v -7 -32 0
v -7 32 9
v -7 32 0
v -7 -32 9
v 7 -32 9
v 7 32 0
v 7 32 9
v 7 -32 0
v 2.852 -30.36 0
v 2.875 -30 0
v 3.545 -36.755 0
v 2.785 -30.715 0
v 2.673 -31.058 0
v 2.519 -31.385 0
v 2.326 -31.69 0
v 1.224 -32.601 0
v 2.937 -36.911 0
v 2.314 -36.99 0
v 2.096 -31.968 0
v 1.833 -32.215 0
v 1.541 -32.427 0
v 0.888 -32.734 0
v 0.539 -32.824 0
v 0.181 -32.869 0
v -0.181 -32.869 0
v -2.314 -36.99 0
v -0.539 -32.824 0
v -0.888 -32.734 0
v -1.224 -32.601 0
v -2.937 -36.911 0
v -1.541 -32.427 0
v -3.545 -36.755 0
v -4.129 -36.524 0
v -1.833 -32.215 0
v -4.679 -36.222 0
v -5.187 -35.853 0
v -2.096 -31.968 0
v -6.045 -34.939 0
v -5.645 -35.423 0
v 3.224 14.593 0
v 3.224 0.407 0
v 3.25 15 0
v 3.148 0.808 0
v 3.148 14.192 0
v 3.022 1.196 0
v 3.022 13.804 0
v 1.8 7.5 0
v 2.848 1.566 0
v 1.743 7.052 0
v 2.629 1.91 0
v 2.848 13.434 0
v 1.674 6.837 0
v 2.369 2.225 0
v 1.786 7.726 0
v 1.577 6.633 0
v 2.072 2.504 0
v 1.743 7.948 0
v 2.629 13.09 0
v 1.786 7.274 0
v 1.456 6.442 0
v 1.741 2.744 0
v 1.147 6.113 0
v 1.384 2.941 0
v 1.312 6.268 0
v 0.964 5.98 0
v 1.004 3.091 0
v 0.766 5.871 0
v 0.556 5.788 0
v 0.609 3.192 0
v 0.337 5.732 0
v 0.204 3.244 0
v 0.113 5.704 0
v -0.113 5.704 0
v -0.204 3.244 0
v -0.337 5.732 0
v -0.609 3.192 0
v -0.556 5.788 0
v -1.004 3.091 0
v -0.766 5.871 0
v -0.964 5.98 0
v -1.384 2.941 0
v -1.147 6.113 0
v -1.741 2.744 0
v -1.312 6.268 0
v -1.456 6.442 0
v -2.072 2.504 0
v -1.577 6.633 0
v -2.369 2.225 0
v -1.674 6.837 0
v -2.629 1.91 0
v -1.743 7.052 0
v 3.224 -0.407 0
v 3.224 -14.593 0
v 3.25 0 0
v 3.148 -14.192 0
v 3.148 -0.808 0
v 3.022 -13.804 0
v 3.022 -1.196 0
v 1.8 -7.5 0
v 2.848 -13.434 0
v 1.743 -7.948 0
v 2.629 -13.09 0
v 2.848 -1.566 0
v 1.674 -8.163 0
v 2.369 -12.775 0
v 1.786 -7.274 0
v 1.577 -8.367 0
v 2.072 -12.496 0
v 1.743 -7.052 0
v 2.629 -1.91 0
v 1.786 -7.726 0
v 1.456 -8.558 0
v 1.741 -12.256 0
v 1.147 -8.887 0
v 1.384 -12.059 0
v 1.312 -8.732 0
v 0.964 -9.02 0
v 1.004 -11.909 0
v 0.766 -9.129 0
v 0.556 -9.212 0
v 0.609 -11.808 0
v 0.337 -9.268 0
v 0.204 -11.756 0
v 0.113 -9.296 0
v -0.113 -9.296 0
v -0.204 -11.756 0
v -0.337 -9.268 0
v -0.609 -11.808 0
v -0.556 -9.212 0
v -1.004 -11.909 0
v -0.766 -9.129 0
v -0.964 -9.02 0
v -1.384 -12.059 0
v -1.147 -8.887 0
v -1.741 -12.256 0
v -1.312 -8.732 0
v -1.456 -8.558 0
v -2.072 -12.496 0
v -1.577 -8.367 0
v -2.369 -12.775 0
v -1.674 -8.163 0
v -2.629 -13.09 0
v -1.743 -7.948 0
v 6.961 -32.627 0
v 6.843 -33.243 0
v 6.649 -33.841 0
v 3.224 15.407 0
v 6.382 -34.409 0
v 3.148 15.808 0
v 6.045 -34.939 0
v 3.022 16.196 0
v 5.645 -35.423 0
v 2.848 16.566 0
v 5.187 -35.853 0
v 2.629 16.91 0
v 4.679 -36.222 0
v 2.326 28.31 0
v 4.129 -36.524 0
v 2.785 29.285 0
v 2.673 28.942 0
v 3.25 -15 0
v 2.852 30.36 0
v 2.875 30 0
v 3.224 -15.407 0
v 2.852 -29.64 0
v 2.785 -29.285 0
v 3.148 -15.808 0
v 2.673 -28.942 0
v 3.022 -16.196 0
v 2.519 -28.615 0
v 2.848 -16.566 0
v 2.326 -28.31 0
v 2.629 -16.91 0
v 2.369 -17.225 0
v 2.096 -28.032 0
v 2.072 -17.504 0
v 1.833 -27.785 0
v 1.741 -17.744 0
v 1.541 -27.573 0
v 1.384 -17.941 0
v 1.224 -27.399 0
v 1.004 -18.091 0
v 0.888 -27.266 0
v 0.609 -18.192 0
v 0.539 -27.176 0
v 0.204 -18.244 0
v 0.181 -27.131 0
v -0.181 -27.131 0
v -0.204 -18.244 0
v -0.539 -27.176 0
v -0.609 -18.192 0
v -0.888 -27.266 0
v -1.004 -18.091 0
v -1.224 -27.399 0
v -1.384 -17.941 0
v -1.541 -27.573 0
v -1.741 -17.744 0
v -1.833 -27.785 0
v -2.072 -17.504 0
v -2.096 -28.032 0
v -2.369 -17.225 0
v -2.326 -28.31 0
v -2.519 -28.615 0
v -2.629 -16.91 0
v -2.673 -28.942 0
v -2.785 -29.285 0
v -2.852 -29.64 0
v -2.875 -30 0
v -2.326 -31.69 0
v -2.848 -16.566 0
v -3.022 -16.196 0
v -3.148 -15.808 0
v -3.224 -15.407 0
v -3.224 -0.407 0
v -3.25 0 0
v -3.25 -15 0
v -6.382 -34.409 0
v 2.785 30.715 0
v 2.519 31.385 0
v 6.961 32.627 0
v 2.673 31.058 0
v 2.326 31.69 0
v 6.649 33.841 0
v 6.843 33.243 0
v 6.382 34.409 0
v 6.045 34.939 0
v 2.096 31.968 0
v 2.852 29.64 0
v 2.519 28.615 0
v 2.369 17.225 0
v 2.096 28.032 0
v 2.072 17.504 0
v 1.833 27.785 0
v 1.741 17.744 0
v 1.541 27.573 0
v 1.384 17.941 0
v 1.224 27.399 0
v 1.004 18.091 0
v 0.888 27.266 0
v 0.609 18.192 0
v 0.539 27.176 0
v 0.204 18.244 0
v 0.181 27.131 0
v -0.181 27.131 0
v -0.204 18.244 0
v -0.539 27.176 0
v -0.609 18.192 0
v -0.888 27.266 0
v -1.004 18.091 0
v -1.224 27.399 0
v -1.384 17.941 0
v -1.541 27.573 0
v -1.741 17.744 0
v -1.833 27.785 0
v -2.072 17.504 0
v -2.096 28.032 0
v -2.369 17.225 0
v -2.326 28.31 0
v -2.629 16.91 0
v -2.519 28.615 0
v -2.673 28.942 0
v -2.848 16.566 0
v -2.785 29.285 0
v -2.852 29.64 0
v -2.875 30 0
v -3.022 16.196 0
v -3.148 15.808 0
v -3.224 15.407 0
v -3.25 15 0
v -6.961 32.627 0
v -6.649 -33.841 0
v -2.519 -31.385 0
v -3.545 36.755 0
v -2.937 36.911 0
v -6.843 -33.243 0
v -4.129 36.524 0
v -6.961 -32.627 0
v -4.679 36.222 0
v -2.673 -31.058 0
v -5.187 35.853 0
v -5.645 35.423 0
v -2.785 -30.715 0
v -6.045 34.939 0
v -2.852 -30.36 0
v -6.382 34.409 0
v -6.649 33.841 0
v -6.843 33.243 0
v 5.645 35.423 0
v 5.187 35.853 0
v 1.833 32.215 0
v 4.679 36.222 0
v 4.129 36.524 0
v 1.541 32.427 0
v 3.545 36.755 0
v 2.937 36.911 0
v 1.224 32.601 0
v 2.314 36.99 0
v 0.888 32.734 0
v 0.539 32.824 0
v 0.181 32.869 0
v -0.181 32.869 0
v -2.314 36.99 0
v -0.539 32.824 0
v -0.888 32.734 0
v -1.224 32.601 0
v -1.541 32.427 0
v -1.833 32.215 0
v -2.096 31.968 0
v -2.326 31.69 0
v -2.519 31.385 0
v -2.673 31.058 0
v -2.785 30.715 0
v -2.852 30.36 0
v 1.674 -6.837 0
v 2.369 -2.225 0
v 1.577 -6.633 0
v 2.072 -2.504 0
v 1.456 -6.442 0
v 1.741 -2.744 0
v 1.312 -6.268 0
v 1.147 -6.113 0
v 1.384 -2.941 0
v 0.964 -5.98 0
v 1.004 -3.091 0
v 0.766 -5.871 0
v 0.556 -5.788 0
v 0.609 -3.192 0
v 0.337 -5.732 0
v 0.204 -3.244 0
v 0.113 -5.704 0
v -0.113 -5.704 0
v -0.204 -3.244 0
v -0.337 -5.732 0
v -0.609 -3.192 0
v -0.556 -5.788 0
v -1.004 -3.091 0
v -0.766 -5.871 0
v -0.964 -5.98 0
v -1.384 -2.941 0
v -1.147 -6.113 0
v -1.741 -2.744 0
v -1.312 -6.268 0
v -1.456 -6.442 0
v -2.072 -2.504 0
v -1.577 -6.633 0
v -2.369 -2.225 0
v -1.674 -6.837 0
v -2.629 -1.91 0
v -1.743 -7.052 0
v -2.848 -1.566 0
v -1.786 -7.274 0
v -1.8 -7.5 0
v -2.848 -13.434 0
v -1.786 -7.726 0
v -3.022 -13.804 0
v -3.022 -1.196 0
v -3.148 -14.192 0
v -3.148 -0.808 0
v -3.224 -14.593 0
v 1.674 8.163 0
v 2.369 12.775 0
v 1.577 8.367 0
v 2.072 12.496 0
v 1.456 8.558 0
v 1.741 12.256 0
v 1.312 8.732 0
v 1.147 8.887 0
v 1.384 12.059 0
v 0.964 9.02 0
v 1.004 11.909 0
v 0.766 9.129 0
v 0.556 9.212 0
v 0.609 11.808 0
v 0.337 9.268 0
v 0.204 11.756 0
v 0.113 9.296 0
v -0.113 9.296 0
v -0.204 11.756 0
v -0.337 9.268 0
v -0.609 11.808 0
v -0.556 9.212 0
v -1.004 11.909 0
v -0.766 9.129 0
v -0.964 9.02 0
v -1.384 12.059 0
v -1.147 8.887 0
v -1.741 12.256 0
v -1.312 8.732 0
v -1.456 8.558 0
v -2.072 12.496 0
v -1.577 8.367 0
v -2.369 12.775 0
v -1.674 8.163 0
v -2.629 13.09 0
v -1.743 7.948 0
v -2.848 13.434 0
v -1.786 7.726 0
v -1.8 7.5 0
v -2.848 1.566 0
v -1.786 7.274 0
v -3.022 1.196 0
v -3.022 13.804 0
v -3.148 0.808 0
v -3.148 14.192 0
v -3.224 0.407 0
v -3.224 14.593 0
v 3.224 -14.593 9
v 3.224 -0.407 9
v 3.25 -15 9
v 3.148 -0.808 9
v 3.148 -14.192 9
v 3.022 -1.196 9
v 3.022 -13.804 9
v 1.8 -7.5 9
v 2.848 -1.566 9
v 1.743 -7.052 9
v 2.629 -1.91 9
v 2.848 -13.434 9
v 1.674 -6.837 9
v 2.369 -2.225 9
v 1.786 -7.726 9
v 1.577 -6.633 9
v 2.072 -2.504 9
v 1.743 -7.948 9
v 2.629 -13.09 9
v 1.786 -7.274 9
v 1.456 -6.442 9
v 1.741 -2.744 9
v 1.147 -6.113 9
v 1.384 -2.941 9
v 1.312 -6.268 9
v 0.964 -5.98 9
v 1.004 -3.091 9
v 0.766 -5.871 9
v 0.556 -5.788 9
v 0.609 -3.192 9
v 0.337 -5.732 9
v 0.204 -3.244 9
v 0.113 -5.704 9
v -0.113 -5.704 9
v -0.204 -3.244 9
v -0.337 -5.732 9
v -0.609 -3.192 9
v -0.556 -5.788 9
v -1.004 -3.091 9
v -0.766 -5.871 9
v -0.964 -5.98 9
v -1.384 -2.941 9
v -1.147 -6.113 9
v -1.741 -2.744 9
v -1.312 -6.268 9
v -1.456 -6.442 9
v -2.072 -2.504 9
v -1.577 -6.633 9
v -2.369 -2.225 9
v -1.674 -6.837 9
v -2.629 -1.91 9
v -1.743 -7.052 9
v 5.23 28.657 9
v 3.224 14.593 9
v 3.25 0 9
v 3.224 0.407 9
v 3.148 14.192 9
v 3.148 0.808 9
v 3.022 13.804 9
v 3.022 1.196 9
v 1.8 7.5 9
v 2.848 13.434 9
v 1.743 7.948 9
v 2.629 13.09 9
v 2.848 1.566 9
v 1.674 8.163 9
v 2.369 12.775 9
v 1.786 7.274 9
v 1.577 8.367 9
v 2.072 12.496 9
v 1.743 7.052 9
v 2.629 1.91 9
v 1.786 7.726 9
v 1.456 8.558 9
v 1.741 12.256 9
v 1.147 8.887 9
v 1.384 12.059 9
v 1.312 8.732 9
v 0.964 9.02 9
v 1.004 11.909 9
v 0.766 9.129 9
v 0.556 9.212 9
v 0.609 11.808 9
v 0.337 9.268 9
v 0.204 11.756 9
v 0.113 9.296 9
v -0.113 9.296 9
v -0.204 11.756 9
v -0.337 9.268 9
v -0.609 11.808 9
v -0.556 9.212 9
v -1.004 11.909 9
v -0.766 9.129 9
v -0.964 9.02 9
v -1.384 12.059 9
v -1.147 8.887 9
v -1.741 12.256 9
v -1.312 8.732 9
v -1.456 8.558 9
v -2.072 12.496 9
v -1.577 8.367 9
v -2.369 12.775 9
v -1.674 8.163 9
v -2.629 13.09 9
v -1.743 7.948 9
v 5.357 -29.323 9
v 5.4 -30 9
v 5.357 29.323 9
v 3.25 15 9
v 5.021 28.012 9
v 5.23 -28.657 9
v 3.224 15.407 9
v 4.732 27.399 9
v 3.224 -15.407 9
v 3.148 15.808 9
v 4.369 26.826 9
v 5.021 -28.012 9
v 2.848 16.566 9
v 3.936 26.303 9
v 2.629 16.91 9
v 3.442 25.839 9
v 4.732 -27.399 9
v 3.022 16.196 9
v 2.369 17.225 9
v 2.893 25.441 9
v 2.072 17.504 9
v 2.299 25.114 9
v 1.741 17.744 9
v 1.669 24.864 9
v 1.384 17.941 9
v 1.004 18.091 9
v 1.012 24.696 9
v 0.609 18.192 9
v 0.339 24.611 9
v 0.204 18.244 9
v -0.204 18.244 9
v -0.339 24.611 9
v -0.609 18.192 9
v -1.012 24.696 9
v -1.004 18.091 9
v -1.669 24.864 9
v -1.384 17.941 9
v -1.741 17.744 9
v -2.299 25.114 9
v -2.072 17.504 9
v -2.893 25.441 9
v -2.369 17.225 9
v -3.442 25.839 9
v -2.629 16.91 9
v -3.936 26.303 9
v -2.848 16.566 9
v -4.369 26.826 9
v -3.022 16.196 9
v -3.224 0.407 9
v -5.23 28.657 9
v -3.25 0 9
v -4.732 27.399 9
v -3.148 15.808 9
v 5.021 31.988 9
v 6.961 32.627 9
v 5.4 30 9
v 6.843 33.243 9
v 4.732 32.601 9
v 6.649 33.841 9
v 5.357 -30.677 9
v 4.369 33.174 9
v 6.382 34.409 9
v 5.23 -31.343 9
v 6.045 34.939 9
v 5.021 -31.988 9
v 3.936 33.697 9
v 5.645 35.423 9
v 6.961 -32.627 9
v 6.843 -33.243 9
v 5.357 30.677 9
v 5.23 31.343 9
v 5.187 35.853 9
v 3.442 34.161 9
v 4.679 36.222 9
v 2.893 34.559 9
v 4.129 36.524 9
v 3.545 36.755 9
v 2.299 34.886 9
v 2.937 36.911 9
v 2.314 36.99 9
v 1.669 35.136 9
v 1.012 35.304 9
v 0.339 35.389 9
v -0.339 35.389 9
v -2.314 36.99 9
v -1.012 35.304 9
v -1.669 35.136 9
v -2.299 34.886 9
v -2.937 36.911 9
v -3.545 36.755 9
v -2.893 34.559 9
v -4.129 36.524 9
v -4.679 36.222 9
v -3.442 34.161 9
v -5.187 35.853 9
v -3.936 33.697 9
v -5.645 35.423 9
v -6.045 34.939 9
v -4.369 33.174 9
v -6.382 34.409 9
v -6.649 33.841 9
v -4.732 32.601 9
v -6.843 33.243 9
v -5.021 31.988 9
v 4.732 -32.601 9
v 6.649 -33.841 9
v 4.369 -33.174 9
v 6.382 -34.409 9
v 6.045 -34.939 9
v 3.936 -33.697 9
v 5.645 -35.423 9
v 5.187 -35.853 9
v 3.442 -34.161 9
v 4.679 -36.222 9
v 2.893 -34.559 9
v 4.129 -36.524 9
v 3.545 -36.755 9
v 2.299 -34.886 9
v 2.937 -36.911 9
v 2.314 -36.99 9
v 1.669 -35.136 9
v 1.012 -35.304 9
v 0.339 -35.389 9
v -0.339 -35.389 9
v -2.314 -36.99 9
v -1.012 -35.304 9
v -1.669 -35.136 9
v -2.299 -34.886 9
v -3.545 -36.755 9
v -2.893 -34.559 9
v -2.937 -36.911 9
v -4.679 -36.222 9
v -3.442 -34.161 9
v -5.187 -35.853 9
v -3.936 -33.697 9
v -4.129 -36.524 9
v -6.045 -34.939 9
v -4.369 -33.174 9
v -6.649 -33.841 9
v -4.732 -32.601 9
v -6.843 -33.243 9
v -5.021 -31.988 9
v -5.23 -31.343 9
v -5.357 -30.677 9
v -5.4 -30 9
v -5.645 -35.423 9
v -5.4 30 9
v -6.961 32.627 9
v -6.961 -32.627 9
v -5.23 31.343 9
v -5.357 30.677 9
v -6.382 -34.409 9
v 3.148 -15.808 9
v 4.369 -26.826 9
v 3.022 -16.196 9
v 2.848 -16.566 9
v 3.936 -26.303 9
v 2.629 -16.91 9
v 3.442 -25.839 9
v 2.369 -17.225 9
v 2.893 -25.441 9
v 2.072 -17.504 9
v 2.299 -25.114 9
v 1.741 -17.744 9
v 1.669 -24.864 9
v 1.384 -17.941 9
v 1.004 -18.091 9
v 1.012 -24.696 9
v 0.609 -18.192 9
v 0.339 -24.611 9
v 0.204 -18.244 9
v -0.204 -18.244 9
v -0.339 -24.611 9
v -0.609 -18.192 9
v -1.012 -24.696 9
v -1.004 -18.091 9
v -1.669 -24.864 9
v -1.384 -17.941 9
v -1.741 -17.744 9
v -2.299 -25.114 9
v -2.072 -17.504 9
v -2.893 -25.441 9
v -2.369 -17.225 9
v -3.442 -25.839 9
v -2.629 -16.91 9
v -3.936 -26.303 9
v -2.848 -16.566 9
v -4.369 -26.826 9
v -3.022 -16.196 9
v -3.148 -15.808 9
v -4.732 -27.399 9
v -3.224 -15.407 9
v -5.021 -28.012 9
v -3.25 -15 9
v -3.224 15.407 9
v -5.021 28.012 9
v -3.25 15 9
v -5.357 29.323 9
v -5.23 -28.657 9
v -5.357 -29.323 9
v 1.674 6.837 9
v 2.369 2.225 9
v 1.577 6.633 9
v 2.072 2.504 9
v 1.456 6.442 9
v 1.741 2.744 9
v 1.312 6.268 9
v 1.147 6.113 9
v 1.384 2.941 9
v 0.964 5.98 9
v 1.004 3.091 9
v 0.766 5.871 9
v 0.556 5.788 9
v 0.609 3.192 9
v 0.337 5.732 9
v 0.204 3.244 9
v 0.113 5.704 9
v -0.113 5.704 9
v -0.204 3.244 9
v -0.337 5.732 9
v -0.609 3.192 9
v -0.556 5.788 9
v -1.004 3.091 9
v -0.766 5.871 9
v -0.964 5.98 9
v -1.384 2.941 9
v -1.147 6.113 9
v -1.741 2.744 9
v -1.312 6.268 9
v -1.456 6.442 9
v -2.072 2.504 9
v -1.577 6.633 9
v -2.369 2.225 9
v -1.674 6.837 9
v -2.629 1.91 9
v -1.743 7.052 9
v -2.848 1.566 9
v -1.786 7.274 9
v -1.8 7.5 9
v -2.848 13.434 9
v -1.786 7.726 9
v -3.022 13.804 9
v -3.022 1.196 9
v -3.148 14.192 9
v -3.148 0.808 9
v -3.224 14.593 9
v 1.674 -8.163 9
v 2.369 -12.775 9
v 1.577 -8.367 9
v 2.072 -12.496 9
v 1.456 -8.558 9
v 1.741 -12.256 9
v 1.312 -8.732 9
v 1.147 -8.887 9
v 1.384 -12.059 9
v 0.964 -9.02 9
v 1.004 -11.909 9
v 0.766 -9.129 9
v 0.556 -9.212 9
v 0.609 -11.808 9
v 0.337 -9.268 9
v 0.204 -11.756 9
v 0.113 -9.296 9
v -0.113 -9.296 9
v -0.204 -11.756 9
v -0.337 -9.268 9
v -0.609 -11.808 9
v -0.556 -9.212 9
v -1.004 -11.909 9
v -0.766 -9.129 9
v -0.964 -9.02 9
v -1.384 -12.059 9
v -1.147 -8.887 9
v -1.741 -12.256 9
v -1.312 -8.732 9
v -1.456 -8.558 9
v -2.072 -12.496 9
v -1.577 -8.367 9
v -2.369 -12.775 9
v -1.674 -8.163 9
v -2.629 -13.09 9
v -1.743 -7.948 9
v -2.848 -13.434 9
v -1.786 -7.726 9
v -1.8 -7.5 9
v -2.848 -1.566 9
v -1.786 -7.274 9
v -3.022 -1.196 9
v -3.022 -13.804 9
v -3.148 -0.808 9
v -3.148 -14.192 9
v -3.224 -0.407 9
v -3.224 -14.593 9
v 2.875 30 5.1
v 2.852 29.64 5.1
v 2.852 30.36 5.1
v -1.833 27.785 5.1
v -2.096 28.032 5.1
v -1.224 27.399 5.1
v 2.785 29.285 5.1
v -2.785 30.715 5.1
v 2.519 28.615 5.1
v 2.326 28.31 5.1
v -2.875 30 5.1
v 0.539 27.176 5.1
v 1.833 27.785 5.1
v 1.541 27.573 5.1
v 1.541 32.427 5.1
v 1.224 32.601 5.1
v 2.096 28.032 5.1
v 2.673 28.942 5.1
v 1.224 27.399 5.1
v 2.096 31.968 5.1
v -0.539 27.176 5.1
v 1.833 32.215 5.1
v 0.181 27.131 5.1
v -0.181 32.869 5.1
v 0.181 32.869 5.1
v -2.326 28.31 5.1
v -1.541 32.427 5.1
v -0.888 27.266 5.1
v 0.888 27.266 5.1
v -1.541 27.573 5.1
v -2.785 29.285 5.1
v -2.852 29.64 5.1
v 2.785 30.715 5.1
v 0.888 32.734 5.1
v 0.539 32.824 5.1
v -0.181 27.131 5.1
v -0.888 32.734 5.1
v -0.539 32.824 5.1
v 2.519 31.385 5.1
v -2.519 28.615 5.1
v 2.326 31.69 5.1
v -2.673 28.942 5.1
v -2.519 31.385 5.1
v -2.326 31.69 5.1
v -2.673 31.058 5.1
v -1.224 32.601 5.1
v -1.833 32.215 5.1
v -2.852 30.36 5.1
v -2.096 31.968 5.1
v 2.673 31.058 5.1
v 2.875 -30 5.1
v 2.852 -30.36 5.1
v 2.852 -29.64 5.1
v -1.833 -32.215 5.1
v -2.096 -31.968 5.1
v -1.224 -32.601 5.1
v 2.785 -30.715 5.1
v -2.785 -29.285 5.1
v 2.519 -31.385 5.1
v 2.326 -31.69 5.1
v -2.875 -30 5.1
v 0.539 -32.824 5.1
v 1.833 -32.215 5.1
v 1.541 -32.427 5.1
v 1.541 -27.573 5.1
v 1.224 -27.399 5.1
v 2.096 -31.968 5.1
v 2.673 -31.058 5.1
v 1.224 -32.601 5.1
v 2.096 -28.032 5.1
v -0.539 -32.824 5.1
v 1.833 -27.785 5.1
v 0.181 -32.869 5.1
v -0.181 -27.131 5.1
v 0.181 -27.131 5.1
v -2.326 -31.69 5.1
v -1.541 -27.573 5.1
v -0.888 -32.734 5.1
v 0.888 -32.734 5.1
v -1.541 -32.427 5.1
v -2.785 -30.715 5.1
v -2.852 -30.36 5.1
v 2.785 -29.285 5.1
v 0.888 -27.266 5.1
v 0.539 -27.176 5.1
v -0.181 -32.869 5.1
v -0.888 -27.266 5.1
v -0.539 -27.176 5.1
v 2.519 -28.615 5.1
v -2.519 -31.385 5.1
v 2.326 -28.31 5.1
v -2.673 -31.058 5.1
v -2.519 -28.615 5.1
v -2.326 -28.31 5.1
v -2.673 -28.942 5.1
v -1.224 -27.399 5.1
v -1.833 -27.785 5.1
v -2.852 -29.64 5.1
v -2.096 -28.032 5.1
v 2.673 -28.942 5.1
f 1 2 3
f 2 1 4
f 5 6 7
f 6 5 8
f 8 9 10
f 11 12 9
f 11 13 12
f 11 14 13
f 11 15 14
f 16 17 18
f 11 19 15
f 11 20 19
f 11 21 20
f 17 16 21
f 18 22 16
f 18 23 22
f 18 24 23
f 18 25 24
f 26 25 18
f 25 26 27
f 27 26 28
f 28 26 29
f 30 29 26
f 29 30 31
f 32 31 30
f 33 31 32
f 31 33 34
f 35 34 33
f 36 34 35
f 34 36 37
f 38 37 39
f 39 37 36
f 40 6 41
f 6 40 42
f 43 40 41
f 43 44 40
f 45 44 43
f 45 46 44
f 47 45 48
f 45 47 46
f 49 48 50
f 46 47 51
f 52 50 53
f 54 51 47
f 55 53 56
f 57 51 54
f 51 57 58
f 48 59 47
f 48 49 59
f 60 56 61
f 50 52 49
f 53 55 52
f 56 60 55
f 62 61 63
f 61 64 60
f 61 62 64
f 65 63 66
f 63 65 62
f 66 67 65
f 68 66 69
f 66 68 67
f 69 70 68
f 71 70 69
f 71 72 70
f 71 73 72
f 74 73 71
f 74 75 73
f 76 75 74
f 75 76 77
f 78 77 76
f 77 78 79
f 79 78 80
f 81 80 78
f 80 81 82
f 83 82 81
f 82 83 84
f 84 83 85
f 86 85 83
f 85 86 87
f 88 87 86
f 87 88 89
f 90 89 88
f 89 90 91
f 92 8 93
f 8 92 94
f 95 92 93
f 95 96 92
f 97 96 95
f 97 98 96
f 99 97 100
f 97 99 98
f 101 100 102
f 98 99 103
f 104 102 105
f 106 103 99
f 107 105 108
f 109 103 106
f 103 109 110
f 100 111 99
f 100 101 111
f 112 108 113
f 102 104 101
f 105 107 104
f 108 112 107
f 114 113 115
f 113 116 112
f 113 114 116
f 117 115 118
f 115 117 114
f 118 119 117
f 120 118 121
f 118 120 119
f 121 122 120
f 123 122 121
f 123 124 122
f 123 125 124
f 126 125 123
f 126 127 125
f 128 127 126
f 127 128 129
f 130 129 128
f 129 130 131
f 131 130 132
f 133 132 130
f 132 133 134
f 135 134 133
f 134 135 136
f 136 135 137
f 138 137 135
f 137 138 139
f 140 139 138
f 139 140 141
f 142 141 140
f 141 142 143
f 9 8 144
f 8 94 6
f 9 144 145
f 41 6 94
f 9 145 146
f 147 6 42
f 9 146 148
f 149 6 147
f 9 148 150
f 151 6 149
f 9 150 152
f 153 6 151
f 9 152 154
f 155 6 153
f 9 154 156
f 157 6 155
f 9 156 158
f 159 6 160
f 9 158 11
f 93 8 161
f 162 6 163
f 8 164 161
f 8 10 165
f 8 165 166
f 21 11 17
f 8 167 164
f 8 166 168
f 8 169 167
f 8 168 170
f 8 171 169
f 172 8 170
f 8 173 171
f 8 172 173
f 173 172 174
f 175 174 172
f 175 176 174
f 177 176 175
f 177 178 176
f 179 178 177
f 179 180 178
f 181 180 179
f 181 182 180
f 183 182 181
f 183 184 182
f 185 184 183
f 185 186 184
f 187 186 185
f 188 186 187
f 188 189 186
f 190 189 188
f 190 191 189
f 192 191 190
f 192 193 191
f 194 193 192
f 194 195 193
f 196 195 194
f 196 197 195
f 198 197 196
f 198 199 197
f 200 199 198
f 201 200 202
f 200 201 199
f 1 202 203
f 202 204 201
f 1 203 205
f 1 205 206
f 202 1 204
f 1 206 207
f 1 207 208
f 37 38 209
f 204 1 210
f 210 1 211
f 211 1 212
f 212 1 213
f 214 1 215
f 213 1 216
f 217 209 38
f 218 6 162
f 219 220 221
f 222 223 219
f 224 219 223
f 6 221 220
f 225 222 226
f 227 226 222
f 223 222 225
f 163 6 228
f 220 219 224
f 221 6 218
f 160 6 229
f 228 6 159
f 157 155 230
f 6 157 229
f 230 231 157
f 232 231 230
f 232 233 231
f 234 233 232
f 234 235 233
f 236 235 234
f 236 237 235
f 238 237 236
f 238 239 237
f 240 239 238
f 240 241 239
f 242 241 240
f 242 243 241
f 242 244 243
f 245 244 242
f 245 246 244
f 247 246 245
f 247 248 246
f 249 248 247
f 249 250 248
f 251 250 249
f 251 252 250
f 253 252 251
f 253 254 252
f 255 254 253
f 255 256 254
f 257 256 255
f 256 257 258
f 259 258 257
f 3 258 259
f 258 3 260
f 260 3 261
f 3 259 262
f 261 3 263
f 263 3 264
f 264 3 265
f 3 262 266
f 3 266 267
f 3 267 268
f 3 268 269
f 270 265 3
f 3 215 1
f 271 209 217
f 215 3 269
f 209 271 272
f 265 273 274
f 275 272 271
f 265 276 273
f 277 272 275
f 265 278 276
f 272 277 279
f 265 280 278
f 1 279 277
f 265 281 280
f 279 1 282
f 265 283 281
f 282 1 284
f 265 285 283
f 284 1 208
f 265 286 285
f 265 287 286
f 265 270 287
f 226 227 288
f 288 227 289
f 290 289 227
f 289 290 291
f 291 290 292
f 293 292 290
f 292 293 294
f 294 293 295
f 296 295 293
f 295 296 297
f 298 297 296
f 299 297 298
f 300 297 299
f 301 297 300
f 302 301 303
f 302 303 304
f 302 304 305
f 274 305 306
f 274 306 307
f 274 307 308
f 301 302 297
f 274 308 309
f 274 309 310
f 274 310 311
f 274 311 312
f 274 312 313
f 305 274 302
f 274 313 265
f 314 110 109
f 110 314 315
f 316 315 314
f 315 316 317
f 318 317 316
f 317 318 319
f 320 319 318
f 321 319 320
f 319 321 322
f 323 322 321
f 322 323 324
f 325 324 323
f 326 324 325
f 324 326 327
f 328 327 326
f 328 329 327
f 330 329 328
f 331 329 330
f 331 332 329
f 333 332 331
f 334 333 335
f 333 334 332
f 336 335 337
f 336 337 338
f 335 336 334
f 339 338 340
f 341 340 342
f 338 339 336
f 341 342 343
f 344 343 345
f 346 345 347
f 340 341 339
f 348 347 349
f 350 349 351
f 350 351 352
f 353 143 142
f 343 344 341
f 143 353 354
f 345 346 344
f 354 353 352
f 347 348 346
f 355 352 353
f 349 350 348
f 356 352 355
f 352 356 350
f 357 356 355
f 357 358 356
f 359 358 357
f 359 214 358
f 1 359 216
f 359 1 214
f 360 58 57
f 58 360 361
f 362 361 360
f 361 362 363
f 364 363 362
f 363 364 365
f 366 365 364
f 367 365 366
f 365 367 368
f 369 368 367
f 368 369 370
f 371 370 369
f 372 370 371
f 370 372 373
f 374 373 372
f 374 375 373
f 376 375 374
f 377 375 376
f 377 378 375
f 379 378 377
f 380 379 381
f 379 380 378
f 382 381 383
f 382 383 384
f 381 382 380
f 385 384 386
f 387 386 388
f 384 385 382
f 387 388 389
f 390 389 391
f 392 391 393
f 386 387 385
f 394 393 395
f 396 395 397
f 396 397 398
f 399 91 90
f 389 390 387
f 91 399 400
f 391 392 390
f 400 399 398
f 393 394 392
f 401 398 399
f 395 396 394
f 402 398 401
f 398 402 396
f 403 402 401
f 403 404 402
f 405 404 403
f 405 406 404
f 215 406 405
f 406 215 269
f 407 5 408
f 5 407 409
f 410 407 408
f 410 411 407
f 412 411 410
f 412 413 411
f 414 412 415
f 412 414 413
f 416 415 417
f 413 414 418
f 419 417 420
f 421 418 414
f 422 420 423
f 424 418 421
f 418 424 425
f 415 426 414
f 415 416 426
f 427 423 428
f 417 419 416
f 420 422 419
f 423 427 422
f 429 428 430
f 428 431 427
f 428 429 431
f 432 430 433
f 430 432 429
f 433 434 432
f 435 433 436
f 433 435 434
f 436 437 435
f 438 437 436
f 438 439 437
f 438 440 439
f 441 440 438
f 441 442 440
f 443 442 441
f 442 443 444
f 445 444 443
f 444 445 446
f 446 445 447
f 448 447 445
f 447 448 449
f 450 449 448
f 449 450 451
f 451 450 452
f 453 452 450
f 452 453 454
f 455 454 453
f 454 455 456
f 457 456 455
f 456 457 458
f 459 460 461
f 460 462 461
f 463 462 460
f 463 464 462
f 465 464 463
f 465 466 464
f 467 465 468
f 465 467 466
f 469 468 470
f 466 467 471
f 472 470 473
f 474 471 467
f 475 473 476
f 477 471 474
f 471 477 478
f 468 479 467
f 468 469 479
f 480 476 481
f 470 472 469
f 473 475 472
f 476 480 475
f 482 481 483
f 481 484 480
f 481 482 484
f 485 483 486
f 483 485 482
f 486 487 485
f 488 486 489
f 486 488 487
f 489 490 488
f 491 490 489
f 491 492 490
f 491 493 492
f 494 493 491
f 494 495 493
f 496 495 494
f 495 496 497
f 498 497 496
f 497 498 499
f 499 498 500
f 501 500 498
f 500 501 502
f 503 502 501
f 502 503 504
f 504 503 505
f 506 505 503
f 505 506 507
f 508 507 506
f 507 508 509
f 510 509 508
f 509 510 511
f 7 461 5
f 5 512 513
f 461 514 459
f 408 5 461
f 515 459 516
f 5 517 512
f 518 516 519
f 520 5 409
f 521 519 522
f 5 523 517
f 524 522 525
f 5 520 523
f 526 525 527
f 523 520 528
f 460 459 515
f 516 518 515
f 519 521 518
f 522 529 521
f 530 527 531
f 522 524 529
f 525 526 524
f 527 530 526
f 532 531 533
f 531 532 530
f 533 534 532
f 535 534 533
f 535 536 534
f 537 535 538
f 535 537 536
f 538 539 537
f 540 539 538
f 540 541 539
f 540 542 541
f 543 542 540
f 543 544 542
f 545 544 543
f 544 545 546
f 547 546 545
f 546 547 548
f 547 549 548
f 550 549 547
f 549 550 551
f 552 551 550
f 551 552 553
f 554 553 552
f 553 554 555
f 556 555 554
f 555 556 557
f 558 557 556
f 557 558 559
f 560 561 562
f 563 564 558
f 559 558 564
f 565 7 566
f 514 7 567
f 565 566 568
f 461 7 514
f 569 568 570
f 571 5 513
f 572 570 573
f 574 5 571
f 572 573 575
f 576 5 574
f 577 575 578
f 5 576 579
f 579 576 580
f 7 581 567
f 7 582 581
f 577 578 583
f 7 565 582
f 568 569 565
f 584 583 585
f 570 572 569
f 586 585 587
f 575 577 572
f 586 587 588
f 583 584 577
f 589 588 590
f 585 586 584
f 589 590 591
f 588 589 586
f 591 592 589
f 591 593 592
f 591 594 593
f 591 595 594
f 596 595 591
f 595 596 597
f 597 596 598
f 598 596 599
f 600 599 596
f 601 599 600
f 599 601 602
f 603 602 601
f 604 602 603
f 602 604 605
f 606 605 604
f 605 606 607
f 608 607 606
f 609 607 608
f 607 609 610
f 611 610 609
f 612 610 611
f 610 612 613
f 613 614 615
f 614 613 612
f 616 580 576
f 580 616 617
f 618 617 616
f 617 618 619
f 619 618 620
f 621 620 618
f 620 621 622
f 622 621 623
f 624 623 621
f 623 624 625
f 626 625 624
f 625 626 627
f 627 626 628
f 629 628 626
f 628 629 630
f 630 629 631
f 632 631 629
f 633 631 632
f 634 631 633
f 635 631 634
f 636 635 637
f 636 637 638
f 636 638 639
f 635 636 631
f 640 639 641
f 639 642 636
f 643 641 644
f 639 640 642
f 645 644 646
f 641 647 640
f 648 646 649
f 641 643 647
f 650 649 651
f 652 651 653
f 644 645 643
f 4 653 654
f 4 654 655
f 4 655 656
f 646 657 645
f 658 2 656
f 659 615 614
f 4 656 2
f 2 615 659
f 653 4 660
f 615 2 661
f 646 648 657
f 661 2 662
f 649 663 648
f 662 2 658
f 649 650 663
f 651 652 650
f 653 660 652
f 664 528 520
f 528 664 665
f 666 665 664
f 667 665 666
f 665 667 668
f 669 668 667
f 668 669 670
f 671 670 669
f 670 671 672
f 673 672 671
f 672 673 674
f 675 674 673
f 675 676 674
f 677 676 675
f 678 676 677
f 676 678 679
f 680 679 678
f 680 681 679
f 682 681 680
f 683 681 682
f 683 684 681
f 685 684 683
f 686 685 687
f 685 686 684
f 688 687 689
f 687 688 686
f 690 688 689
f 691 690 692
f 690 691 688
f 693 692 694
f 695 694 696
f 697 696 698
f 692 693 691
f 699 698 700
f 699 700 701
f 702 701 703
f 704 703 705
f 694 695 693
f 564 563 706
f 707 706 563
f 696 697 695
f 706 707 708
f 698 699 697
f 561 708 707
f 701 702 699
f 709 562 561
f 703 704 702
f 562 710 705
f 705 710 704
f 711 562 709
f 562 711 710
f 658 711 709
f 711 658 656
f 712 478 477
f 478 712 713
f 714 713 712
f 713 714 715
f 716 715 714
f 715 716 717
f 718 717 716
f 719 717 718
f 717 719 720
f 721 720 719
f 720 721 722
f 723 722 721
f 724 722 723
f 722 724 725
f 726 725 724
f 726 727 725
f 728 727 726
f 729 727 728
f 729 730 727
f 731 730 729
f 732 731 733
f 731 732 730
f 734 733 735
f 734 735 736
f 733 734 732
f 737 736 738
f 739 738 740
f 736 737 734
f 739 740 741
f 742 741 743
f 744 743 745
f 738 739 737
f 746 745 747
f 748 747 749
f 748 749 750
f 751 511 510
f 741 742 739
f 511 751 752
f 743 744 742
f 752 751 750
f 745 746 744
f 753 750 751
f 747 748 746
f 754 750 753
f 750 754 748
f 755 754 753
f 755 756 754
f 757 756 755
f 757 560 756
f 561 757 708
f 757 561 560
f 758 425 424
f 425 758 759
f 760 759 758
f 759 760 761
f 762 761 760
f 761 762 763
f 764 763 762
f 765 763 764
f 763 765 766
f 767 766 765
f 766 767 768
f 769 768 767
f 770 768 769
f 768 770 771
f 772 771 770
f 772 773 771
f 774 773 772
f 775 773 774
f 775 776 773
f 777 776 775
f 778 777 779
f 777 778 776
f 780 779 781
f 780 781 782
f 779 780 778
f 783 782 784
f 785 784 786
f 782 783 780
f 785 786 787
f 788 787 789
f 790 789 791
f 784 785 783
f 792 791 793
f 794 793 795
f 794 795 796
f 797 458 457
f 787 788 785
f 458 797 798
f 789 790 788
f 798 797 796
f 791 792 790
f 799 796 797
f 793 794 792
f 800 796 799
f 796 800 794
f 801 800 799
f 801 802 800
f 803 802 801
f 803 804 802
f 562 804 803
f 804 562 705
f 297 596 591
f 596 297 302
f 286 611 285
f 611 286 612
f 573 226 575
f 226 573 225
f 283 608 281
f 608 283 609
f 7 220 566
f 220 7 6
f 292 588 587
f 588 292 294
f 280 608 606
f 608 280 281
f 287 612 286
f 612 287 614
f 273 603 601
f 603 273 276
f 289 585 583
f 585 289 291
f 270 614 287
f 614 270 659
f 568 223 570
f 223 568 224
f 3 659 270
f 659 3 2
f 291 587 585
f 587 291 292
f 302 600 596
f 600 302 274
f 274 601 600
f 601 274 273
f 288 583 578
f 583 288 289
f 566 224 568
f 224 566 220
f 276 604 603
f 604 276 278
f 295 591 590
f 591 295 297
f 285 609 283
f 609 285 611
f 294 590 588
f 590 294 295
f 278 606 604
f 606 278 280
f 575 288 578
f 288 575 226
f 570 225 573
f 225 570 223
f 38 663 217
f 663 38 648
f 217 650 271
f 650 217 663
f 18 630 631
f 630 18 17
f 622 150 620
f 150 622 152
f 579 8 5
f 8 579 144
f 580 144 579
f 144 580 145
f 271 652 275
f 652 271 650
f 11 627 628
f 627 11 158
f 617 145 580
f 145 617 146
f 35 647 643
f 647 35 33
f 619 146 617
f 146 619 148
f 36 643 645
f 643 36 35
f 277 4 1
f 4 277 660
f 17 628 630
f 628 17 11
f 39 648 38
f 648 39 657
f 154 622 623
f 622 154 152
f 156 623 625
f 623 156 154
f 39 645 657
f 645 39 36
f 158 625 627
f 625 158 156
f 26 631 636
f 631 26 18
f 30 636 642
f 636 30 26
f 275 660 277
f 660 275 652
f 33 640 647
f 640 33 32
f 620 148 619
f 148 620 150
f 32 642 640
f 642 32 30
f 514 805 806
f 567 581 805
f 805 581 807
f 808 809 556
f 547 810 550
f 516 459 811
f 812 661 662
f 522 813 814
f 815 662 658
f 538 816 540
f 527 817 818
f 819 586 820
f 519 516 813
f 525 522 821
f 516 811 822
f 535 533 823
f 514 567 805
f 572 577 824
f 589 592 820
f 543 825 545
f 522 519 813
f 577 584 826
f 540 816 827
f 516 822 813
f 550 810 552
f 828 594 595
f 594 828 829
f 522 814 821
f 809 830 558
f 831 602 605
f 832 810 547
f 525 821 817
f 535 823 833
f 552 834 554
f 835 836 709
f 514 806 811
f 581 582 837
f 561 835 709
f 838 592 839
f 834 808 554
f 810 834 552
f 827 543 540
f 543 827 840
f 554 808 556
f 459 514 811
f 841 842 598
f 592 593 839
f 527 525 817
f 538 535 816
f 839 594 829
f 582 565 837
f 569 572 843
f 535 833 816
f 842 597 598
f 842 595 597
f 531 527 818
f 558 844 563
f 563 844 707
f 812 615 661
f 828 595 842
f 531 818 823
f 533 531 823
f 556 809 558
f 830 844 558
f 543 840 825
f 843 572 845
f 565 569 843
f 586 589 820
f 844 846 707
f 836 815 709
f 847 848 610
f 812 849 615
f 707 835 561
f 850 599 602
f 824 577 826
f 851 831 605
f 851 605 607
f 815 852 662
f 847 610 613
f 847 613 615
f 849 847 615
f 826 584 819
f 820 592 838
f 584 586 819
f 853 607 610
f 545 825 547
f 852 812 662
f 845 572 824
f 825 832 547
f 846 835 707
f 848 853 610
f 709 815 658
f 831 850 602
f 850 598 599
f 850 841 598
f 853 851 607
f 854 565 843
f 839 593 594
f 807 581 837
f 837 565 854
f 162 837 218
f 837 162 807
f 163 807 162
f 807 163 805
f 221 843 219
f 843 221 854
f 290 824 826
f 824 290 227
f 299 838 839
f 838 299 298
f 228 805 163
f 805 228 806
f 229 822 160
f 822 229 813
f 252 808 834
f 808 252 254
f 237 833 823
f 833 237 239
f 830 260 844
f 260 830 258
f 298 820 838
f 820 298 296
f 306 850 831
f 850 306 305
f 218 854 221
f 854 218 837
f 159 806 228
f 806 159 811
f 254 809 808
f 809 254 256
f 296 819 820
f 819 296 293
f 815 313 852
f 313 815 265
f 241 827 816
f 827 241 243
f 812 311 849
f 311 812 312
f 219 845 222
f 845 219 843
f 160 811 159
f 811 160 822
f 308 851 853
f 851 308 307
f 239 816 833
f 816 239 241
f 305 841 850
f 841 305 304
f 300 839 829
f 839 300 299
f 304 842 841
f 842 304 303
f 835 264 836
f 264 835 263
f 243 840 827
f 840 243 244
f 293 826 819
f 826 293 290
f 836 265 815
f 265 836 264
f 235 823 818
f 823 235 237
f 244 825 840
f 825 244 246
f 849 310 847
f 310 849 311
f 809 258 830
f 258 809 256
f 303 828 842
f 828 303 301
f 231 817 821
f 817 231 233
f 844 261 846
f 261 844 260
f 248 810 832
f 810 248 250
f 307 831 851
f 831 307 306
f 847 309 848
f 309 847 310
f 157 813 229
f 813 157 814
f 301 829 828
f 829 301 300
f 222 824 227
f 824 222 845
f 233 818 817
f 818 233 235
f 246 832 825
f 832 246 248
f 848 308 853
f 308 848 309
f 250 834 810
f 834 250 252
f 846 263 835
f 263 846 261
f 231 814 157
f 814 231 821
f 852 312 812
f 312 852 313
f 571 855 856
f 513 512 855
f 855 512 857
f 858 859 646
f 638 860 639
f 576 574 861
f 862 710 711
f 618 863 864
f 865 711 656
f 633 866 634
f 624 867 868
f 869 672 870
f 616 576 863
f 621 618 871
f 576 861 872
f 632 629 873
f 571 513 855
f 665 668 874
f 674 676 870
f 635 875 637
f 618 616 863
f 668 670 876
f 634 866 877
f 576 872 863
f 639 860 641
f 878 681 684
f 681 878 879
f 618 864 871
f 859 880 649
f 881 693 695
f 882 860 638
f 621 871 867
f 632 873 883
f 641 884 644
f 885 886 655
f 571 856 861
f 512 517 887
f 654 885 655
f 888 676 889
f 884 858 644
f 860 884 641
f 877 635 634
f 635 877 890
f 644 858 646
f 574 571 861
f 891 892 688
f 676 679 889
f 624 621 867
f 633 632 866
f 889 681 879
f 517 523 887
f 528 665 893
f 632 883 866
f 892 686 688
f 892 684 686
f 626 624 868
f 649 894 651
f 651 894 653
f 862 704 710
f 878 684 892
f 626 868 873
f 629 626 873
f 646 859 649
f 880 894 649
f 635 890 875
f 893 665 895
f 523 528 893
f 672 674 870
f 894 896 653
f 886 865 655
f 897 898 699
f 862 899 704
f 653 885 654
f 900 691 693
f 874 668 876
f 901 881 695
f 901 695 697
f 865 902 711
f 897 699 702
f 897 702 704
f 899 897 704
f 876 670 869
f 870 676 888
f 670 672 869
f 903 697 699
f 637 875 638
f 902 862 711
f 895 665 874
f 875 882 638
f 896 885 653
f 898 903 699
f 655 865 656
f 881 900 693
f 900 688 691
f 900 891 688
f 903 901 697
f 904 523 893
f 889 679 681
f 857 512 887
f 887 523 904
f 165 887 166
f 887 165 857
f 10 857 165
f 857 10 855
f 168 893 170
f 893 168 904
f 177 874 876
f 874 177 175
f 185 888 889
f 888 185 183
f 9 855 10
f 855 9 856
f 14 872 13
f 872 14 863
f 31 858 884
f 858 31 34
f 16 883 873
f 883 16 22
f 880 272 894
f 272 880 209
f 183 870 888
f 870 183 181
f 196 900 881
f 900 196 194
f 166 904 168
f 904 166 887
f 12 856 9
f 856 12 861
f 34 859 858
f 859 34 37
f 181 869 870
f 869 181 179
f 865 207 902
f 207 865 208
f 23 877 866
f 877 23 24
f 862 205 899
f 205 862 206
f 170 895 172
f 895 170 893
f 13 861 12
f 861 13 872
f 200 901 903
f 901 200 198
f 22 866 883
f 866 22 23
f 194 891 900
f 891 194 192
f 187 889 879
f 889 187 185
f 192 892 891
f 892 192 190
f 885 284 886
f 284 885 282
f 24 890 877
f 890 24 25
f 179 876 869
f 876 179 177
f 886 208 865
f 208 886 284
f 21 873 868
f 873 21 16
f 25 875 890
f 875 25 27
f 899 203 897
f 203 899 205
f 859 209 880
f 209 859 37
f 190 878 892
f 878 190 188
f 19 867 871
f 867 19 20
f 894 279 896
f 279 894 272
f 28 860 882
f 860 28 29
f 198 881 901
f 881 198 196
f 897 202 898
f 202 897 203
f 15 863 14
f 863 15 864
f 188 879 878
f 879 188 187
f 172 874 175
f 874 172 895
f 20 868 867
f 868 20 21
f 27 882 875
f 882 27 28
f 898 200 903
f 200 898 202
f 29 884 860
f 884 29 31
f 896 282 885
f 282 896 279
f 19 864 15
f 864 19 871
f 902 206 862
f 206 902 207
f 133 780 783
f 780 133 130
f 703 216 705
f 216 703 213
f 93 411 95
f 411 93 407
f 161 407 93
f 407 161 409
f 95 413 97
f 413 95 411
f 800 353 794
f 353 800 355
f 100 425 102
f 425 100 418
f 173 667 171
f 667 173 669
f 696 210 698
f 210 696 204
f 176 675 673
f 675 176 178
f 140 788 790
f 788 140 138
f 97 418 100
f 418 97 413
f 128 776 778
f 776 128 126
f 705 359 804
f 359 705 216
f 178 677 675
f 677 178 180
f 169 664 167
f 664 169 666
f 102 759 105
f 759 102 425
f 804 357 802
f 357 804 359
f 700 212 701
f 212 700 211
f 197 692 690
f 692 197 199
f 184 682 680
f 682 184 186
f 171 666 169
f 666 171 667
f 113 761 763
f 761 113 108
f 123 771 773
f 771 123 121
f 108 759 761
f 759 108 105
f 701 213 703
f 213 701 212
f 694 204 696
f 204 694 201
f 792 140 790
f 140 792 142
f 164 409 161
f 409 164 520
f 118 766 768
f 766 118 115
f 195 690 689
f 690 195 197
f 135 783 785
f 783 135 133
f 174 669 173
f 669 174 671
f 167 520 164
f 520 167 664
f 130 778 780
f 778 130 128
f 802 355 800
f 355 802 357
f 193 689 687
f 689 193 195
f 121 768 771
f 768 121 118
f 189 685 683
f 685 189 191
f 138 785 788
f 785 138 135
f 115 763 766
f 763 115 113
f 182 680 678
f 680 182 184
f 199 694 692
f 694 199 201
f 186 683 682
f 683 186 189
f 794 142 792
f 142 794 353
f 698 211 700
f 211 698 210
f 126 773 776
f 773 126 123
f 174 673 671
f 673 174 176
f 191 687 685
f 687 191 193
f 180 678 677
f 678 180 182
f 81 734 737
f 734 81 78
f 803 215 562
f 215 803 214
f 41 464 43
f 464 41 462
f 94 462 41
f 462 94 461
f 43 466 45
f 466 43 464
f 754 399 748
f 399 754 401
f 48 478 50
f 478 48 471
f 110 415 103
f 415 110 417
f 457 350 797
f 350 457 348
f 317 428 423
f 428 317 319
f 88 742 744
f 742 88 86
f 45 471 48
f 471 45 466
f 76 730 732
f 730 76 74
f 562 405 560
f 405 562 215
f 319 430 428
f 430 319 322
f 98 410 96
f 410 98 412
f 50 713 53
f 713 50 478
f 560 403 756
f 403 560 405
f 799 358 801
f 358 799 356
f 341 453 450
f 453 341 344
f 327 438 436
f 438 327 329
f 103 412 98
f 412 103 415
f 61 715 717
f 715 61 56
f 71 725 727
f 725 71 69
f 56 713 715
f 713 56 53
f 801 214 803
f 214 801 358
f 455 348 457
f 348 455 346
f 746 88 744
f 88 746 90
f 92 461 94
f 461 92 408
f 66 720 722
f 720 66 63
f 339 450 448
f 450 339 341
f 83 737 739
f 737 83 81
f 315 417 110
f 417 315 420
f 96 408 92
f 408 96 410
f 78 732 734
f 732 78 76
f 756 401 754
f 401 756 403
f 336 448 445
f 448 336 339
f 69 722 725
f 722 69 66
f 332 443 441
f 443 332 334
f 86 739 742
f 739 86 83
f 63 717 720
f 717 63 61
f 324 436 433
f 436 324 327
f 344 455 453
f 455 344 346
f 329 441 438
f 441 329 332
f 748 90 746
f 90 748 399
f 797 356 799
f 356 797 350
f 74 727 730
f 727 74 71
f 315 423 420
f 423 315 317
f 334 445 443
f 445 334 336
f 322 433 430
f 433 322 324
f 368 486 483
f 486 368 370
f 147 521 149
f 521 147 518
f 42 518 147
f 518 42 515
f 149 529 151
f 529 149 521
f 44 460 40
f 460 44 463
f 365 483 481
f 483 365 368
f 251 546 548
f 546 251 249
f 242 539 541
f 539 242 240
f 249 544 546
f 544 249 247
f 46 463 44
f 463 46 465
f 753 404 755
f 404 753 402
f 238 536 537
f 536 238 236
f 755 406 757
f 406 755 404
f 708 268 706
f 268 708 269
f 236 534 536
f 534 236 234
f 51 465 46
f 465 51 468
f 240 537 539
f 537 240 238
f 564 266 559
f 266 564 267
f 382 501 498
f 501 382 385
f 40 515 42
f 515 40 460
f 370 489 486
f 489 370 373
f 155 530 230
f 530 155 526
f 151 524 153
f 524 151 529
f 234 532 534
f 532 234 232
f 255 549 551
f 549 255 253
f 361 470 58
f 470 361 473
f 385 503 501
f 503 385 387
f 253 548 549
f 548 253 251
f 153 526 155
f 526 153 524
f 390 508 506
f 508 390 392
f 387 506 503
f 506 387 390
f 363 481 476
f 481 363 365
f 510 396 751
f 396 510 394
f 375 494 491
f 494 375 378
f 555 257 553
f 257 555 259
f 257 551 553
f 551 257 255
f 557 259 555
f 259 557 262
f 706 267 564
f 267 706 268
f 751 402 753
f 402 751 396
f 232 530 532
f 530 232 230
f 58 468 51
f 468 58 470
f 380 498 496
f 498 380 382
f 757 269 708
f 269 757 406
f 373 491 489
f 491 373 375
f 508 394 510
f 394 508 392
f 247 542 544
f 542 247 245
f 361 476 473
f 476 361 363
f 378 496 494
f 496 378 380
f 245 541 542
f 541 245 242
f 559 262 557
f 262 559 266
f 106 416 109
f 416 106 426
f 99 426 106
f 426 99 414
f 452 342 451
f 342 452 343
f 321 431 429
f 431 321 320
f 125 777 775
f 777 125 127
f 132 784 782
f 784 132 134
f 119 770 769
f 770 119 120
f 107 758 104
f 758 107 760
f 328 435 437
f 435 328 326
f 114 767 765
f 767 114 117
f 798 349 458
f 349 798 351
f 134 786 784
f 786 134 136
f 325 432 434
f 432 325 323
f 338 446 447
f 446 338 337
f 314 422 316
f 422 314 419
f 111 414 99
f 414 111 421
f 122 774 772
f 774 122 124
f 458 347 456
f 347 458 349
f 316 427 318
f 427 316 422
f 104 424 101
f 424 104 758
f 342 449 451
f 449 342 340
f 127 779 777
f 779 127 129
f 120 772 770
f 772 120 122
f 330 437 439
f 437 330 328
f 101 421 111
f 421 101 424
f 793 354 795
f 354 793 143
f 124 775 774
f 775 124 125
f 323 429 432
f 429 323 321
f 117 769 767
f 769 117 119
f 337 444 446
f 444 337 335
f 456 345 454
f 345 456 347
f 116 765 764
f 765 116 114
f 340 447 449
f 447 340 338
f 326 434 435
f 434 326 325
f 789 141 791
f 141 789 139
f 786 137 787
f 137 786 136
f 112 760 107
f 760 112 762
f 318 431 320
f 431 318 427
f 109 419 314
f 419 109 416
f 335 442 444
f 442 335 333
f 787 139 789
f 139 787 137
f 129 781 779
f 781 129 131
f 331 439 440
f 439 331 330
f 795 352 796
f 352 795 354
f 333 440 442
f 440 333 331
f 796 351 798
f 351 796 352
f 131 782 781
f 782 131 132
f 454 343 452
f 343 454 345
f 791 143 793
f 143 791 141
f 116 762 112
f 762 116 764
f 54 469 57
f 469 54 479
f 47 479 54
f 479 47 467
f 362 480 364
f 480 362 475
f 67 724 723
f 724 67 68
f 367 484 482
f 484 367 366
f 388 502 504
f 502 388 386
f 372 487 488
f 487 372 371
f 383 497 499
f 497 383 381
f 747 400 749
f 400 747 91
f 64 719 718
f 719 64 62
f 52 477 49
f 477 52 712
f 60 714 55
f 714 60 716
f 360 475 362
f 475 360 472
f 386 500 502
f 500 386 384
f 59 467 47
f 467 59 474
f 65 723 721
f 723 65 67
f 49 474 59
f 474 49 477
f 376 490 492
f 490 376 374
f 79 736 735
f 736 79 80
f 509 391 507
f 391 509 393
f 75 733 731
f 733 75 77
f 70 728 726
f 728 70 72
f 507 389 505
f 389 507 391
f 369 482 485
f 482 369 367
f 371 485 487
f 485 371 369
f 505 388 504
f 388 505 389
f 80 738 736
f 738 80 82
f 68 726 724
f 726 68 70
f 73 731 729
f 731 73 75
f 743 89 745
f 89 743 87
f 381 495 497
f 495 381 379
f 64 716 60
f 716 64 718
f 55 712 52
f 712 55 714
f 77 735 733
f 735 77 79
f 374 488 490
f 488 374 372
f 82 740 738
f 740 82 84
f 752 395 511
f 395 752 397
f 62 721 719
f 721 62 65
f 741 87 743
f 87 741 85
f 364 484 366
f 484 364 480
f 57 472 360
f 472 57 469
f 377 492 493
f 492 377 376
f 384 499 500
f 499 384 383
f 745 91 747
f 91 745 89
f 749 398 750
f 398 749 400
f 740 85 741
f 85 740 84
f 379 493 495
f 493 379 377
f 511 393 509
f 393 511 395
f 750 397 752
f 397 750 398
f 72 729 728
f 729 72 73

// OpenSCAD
$fn = 50;


difference() {
	union() {
		hull() {
			translate(v = [-2.0000000000, 17.0000000000, 0]) {
				cylinder(h = 9, r = 5);
			}
			translate(v = [2.0000000000, 17.0000000000, 0]) {
				cylinder(h = 9, r = 5);
			}
			translate(v = [-2.0000000000, -17.0000000000, 0]) {
				cylinder(h = 9, r = 5);
			}
			translate(v = [2.0000000000, -17.0000000000, 0]) {
				cylinder(h = 9, r = 5);
			}
		}
		translate(v = [0.0000000000, 22.5000000000, 0]) {
			hull() {
				translate(v = [-2.0000000000, 9.5000000000, 0]) {
					cylinder(h = 9, r = 5);
				}
				translate(v = [2.0000000000, 9.5000000000, 0]) {
					cylinder(h = 9, r = 5);
				}
				translate(v = [-2.0000000000, -9.5000000000, 0]) {
					cylinder(h = 9, r = 5);
				}
				translate(v = [2.0000000000, -9.5000000000, 0]) {
					cylinder(h = 9, r = 5);
				}
			}
		}
		translate(v = [0.0000000000, 22.5000000000, 0]) {
			hull() {
				translate(v = [-2.0000000000, 9.5000000000, 0]) {
					cylinder(h = 9, r = 5);
				}
				translate(v = [2.0000000000, 9.5000000000, 0]) {
					cylinder(h = 9, r = 5);
				}
				translate(v = [-2.0000000000, -9.5000000000, 0]) {
					cylinder(h = 9, r = 5);
				}
				translate(v = [2.0000000000, -9.5000000000, 0]) {
					cylinder(h = 9, r = 5);
				}
			}
		}
		translate(v = [0.0000000000, -22.5000000000, 0]) {
			hull() {
				translate(v = [-2.0000000000, 9.5000000000, 0]) {
					cylinder(h = 9, r = 5);
				}
				translate(v = [2.0000000000, 9.5000000000, 0]) {
					cylinder(h = 9, r = 5);
				}
				translate(v = [-2.0000000000, -9.5000000000, 0]) {
					cylinder(h = 9, r = 5);
				}
				translate(v = [2.0000000000, -9.5000000000, 0]) {
					cylinder(h = 9, r = 5);
				}
			}
		}
		translate(v = [0.0000000000, -22.5000000000, 0]) {
			hull() {
				translate(v = [-2.0000000000, 9.5000000000, 0]) {
					cylinder(h = 9, r = 5);
				}
				translate(v = [2.0000000000, 9.5000000000, 0]) {
					cylinder(h = 9, r = 5);
				}
				translate(v = [-2.0000000000, -9.5000000000, 0]) {
					cylinder(h = 9, r = 5);
				}
				translate(v = [2.0000000000, -9.5000000000, 0]) {
					cylinder(h = 9, r = 5);
				}
			}
		}
	}
	union() {
		translate(v = [0.0000000000, 30.0000000000, 9]) {
			rotate(a = [0, 0, 0]) {
				difference() {
					union() {
						#translate(v = [0, 0, -9.0000000000]) {
							cylinder(h = 9, r = 2.6000000000);
						}
						#translate(v = [0, 0, -3.9000000000]) {
							cylinder(h = 3.9000000000, r1 = 2.8750000000, r2 = 5.4000000000);
						}
						#translate(v = [0, 0, -9.0000000000]) {
							cylinder(h = 9, r = 2.8750000000);
						}
						#translate(v = [0, 0, -9.0000000000]) {
							cylinder(h = 9, r = 2.6000000000);
						}
					}
					union();
				}
			}
		}
		translate(v = [0.0000000000, 30.0000000000, 9]) {
			rotate(a = [0, 0, 0]) {
				difference() {
					union() {
						#translate(v = [0, 0, -9.0000000000]) {
							cylinder(h = 9, r = 2.6000000000);
						}
						#translate(v = [0, 0, -3.9000000000]) {
							cylinder(h = 3.9000000000, r1 = 2.8750000000, r2 = 5.4000000000);
						}
						#translate(v = [0, 0, -9.0000000000]) {
							cylinder(h = 9, r = 2.8750000000);
						}
						#translate(v = [0, 0, -9.0000000000]) {
							cylinder(h = 9, r = 2.6000000000);
						}
					}
					union();
				}
			}
		}
		translate(v = [0.0000000000, -30.0000000000, 9]) {
			rotate(a = [0, 0, 0]) {
				difference() {
					union() {
						#translate(v = [0, 0, -9.0000000000]) {
							cylinder(h = 9, r = 2.6000000000);
						}
						#translate(v = [0, 0, -3.9000000000]) {
							cylinder(h = 3.9000000000, r1 = 2.8750000000, r2 = 5.4000000000);
						}
						#translate(v = [0, 0, -9.0000000000]) {
							cylinder(h = 9, r = 2.8750000000);
						}
						#translate(v = [0, 0, -9.0000000000]) {
							cylinder(h = 9, r = 2.6000000000);
						}
					}
					union();
				}
			}
		}
		translate(v = [0.0000000000, -30.0000000000, 9]) {
			rotate(a = [0, 0, 0]) {
				difference() {
					union() {
						#translate(v = [0, 0, -9.0000000000]) {
							cylinder(h = 9, r = 2.6000000000);
						}
						#translate(v = [0, 0, -3.9000000000]) {
							cylinder(h = 3.9000000000, r1 = 2.8750000000, r2 = 5.4000000000);
						}
						#translate(v = [0, 0, -9.0000000000]) {
							cylinder(h = 9, r = 2.8750000000);
						}
						#translate(v = [0, 0, -9.0000000000]) {
							cylinder(h = 9, r = 2.6000000000);
						}
					}
					union();
				}
			}
		}
		translate(v = [0.0000000000, -15.0000000000, 0]) {
			translate(v = [0, 0, -100]) {
				cylinder(h = 200, r = 3.2500000000);
			}
		}
		translate(v = [0, 0, -100]) {
			cylinder(h = 200, r = 3.2500000000);
		}
		translate(v = [0.0000000000, 15.0000000000, 0]) {
			translate(v = [0, 0, -100]) {
				cylinder(h = 200, r = 3.2500000000);
			}
		}
		translate(v = [0.0000000000, -15.0000000000, 0]) {
			translate(v = [0, 0, -100]) {
				cylinder(h = 200, r = 1.8000000000);
			}
		}
		translate(v = [0.0000000000, -7.5000000000, 0]) {
			translate(v = [0, 0, -100]) {
				cylinder(h = 200, r = 1.8000000000);
			}
		}
		translate(v = [0, 0, -100]) {
			cylinder(h = 200, r = 1.8000000000);
		}
		translate(v = [0.0000000000, 7.5000000000, 0]) {
			translate(v = [0, 0, -100]) {
				cylinder(h = 200, r = 1.8000000000);
			}
		}
		translate(v = [0.0000000000, 15.0000000000, 0]) {
			translate(v = [0, 0, -100]) {
				cylinder(h = 200, r = 1.8000000000);
			}
		}
	}
}
